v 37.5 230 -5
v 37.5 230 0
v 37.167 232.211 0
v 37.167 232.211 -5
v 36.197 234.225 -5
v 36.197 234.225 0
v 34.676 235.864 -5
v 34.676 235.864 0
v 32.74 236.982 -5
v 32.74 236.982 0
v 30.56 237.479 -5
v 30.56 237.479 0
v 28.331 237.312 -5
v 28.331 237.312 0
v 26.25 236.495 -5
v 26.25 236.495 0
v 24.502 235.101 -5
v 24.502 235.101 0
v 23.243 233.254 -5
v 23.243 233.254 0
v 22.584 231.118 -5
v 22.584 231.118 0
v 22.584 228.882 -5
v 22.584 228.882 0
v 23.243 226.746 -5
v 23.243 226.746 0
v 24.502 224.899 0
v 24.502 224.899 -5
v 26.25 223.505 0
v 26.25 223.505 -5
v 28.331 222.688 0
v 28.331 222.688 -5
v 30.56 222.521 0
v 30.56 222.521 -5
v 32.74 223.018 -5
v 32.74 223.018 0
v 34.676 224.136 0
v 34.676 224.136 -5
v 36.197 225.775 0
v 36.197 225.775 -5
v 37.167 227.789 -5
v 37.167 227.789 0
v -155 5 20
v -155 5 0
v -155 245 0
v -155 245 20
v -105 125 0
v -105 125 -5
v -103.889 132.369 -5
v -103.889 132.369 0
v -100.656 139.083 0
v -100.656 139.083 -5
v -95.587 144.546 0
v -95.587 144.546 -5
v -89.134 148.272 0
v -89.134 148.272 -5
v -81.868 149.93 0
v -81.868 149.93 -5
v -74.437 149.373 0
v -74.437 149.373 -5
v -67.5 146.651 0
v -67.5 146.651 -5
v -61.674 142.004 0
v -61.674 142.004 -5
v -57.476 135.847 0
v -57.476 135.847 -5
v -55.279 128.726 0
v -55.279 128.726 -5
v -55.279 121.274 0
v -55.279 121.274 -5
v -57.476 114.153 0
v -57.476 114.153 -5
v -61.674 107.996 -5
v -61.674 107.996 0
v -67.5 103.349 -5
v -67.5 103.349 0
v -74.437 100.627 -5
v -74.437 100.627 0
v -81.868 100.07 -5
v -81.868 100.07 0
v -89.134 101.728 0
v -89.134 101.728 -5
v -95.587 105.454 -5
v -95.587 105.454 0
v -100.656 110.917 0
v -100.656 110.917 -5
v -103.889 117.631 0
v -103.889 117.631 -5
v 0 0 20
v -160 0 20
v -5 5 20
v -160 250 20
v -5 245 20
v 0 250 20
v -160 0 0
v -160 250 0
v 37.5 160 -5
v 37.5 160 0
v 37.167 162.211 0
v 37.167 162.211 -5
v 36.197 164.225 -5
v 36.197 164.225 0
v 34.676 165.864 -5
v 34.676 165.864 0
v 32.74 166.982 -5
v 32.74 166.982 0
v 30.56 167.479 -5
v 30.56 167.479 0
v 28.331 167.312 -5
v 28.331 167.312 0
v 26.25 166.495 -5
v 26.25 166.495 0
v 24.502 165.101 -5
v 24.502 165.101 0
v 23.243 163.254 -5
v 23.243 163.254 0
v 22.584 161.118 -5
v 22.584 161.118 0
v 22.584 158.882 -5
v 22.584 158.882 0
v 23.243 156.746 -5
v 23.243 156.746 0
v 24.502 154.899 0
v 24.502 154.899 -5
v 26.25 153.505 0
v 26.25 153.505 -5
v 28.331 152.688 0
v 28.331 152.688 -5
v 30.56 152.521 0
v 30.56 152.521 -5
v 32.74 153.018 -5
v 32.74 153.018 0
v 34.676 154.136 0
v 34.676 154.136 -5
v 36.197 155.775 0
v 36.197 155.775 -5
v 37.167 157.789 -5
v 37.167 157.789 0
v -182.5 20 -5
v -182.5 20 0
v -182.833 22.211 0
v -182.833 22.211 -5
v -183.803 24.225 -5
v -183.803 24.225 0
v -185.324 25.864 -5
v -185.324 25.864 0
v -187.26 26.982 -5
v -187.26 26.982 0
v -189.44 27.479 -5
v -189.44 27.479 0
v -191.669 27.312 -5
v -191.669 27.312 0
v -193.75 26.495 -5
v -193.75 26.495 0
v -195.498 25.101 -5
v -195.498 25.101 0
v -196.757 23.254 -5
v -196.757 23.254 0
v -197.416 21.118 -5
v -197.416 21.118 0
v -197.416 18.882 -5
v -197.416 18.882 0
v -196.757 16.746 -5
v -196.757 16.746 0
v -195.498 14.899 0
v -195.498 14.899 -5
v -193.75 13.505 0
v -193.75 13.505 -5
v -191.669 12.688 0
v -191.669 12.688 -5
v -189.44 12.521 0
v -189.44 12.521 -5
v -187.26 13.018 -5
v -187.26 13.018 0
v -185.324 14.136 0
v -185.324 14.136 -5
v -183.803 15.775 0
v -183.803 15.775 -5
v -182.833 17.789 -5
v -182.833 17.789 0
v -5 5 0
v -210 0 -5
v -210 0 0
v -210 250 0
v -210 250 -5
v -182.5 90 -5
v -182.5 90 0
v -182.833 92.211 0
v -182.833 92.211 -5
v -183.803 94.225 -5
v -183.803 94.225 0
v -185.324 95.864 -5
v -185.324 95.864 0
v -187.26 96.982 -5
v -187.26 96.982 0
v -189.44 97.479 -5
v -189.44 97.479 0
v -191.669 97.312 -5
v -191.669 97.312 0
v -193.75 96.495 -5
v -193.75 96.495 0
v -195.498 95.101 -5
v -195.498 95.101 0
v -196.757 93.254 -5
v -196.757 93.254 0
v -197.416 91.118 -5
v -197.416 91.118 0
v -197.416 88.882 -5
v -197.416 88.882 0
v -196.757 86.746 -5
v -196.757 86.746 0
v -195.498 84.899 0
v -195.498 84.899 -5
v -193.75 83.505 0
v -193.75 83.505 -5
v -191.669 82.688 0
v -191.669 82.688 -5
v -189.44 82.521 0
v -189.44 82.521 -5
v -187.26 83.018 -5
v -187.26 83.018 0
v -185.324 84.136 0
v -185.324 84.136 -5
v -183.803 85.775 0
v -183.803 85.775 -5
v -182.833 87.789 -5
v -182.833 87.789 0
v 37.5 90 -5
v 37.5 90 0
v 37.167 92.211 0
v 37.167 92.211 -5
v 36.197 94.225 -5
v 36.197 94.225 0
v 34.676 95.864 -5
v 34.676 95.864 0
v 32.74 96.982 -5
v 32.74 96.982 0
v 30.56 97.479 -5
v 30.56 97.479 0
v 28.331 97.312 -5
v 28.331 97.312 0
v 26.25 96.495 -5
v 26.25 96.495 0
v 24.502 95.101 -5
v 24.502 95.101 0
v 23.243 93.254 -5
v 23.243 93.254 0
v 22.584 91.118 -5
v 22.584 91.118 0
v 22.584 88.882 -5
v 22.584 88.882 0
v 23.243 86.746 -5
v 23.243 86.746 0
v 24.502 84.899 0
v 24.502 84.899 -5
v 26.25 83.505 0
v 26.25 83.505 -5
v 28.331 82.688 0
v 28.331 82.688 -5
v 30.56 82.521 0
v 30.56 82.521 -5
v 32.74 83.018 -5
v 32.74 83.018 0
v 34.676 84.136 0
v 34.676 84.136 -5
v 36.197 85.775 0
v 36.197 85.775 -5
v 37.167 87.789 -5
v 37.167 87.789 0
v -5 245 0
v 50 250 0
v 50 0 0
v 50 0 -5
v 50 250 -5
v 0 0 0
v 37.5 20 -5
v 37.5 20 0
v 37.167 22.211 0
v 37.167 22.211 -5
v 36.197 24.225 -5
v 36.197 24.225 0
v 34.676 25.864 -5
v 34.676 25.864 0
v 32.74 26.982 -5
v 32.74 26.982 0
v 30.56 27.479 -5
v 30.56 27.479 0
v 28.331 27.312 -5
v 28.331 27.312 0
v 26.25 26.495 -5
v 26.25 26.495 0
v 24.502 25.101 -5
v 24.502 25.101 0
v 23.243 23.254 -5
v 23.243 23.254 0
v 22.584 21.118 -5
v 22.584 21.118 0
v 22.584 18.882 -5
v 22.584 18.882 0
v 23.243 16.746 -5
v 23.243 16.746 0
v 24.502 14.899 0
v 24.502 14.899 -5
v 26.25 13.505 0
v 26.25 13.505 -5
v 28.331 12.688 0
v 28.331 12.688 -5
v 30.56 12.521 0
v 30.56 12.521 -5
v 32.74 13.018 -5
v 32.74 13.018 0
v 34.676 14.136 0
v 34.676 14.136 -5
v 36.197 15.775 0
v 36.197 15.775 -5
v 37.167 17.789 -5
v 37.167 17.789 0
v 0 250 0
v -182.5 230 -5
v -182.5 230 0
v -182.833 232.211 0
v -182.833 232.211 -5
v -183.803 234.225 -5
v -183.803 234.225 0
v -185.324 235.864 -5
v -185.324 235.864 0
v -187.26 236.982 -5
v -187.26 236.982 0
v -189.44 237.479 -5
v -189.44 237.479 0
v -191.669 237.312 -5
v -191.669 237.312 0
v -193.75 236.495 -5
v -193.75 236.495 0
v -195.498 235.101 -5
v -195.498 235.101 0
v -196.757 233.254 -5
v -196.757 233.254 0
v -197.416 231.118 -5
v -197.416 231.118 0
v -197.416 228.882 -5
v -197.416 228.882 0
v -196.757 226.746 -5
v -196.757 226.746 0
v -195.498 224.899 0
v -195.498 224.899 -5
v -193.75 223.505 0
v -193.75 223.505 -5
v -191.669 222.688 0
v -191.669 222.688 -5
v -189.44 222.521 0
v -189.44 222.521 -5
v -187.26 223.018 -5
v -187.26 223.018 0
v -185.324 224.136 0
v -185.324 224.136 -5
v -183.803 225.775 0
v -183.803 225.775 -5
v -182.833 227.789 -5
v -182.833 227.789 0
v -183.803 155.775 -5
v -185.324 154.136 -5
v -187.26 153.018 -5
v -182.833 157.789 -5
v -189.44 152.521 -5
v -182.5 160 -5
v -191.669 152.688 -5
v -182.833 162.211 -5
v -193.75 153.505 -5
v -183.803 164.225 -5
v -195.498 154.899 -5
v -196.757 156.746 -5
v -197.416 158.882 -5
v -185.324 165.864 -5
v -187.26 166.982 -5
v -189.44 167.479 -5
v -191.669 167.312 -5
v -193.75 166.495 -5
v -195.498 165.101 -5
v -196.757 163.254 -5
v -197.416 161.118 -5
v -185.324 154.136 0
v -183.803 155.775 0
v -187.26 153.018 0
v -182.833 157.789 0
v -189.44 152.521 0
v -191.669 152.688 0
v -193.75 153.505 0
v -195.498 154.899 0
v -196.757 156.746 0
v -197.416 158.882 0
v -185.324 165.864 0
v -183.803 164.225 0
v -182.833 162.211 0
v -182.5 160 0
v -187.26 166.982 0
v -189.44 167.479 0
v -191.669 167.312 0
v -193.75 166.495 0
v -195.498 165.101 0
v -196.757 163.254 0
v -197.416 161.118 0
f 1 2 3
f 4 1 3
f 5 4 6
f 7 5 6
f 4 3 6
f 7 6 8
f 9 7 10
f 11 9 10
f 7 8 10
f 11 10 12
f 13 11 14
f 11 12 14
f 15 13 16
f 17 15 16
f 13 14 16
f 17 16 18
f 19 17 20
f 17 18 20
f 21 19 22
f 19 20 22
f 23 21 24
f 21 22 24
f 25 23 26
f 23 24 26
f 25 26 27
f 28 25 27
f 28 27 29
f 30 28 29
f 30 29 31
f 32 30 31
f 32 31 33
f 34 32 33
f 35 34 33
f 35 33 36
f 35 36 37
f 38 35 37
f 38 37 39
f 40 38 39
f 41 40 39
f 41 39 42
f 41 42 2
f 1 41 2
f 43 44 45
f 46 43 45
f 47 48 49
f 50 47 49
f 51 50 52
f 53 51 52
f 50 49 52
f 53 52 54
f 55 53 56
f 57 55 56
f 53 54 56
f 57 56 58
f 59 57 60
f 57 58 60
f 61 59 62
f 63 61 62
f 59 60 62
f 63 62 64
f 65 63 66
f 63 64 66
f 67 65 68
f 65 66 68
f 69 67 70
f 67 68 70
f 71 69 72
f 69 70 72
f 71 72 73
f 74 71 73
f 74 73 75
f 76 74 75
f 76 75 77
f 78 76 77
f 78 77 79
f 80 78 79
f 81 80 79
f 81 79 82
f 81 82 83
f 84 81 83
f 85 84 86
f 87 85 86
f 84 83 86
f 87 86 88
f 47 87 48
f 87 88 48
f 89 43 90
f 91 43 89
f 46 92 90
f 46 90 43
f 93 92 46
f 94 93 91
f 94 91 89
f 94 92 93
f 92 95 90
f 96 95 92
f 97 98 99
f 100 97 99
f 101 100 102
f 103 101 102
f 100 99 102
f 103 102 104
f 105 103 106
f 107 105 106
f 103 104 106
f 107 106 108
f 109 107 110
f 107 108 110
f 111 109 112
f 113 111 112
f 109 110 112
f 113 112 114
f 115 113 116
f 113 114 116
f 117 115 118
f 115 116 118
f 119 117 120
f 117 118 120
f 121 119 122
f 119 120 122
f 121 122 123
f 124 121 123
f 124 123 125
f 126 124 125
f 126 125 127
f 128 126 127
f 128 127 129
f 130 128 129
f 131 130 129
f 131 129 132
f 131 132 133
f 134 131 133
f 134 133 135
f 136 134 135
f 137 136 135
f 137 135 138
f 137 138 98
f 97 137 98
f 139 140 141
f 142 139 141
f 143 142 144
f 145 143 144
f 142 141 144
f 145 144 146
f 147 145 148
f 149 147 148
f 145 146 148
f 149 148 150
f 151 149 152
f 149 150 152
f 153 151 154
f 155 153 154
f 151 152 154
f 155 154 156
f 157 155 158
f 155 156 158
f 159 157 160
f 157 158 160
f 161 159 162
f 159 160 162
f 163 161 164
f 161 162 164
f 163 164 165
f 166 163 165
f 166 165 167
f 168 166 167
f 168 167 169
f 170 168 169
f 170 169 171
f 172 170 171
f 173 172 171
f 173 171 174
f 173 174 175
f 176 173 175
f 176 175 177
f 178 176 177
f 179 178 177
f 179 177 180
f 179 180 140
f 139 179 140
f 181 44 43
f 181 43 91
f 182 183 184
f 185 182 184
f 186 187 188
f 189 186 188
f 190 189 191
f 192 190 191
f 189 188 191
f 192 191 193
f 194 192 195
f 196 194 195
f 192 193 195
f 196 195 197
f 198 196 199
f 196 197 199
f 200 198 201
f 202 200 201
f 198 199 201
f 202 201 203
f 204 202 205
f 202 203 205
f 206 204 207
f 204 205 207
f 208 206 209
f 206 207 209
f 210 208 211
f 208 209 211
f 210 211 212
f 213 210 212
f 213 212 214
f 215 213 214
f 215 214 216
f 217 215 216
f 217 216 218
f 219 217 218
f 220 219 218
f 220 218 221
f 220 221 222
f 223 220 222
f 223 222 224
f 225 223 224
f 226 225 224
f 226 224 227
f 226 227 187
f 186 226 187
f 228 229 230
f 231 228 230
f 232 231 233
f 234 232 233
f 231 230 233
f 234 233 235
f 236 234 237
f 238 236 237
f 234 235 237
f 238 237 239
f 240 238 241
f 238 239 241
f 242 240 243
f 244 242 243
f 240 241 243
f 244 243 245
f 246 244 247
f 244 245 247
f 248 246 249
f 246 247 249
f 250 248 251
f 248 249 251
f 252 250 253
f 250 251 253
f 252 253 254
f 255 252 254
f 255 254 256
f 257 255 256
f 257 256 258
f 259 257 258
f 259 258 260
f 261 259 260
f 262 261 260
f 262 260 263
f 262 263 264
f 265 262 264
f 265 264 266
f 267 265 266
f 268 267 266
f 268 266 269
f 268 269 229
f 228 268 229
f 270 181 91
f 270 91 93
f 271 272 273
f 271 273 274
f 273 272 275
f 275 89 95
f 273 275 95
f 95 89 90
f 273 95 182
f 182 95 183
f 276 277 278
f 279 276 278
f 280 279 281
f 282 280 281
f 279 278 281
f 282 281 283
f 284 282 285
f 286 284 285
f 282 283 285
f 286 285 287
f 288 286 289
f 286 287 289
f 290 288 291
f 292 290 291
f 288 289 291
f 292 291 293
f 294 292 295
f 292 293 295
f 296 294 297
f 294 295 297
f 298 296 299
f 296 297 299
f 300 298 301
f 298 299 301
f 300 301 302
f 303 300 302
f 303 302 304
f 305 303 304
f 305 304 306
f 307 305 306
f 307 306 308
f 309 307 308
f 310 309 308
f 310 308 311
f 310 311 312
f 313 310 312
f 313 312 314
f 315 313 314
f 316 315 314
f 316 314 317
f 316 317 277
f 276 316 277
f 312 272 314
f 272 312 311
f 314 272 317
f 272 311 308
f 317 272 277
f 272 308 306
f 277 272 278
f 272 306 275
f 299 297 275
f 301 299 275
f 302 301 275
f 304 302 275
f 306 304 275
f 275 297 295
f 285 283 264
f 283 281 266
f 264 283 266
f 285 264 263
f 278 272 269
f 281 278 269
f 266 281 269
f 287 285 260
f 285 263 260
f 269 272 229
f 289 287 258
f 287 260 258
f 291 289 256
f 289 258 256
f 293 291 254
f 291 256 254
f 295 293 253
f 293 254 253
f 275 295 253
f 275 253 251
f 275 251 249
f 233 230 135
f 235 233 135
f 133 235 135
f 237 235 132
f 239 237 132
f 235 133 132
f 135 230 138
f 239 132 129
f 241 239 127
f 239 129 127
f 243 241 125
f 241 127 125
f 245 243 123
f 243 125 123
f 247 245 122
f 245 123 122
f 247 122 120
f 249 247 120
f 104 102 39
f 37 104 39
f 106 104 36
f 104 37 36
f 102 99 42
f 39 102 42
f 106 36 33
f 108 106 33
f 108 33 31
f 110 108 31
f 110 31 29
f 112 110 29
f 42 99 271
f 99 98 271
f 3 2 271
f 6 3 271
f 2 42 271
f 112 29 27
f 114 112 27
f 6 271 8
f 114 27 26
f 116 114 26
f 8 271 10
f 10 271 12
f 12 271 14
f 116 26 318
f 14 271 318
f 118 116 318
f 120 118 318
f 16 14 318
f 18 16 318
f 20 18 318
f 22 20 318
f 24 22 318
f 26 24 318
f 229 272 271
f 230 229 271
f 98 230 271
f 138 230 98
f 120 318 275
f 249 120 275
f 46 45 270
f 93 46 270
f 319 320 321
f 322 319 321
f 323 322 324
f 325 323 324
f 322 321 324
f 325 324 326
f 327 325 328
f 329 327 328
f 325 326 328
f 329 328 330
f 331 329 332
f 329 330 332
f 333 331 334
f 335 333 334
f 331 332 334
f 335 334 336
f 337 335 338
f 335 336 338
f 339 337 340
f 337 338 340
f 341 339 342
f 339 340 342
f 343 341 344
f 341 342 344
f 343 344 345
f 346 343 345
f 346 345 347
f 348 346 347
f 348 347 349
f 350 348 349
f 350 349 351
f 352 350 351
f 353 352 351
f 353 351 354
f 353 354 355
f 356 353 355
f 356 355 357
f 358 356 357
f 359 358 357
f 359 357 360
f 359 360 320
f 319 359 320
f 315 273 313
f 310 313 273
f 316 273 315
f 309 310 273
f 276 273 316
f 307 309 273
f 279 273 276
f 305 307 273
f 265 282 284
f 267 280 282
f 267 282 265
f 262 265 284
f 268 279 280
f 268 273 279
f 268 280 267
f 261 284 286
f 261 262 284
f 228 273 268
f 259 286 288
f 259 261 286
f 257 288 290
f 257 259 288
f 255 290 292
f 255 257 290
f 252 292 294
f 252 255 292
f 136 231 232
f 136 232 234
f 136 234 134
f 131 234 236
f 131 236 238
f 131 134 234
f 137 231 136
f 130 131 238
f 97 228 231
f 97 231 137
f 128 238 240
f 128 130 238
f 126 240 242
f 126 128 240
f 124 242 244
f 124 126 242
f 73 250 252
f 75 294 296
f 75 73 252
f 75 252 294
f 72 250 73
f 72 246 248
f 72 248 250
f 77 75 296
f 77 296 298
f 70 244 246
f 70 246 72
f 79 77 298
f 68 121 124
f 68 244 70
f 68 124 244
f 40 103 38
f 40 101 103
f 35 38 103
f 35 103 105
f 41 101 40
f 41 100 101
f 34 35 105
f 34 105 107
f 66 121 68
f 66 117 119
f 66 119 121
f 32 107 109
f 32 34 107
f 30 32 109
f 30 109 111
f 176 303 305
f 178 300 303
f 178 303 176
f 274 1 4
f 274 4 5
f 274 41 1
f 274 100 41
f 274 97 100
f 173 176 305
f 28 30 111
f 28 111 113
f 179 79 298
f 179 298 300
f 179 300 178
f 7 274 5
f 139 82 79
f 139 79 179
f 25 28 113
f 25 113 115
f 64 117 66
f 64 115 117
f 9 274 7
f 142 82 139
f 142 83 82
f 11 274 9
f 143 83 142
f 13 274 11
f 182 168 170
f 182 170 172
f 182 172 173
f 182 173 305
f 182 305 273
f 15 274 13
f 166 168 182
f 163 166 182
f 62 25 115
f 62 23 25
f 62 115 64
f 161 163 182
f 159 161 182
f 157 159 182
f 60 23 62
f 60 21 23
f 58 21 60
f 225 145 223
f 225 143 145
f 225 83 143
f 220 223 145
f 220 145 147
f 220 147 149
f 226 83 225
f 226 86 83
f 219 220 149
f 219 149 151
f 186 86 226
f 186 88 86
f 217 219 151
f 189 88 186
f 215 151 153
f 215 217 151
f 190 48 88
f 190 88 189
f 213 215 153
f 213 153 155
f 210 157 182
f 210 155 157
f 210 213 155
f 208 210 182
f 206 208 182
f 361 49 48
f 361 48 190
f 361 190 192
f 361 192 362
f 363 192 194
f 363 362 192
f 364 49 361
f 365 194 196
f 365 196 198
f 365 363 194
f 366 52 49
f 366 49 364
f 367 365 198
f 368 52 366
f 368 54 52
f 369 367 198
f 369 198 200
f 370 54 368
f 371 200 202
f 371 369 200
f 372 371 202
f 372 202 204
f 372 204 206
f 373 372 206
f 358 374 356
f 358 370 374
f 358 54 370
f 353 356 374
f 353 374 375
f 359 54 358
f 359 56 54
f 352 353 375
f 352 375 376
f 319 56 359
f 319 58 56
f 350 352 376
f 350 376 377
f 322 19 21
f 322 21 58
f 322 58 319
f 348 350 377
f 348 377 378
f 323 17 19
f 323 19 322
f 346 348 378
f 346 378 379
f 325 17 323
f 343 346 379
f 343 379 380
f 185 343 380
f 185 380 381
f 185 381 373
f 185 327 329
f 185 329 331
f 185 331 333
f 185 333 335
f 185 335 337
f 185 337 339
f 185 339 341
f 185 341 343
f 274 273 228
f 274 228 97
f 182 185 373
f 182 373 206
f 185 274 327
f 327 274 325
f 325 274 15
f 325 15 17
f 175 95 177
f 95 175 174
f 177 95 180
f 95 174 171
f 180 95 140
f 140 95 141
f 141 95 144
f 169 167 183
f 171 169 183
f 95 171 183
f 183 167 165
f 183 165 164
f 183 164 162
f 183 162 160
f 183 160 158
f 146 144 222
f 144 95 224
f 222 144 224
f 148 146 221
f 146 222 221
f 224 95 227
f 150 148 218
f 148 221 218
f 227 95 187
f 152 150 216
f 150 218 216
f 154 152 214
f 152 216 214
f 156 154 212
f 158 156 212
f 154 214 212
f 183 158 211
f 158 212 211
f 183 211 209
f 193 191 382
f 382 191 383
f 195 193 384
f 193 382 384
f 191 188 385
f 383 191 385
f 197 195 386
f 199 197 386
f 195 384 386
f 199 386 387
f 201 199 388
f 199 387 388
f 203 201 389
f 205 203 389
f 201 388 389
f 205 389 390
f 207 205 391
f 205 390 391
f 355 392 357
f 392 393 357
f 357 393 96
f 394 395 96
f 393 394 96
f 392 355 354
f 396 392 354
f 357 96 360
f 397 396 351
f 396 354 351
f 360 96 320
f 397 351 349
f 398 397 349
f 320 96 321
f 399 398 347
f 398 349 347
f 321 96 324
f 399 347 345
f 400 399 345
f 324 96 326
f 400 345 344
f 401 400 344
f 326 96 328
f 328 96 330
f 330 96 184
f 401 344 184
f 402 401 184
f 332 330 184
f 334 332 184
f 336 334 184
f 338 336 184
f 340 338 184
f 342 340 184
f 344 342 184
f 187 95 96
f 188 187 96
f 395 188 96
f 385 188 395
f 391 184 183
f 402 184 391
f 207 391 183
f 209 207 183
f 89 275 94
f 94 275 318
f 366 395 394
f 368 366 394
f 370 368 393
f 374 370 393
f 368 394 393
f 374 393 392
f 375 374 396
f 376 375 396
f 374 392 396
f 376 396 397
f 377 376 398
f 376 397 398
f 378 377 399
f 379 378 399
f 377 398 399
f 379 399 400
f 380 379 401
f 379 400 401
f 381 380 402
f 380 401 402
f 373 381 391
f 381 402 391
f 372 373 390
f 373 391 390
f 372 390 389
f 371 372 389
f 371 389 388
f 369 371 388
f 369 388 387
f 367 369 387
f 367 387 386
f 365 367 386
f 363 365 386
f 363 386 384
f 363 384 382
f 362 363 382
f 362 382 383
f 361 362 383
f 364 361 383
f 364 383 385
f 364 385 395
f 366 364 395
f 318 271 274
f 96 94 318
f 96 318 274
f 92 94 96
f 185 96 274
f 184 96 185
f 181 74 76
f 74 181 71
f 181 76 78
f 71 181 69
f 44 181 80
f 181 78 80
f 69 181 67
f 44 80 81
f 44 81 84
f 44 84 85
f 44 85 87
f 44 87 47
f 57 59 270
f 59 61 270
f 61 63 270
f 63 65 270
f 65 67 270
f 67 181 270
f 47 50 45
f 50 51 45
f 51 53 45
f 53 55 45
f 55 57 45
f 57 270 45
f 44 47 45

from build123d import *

# Parameters (mm, degrees)
ESQUISSE1_W             = 160
ESQUISSE1_H             = 250
ESQUISSE1_W_2           = 150
ESQUISSE1_H_2           = 240
BOSS_EXTRU_1_DEPTH      = 20
ESQUISSE2_W             = 260
ESQUISSE2_H             = 250
BOSS_EXTRU_2_DEPTH      = 5
ESQUISSE3_R             = 25
ENL_V_MAT_EXTRU_1_DEPTH = 5
ESQUISSE4_R             = 7.5
ENL_V_MAT_EXTRU_2_DEPTH = 10


with BuildPart() as part:
    # Esquisse1 → Boss.-Extru.1 (new body)
    with BuildSketch(Plane.XY):
        with Locations((-80, 125)):
            Rectangle(ESQUISSE1_W, ESQUISSE1_H)
        with Locations((-80, 125)):
            Rectangle(ESQUISSE1_W_2, ESQUISSE1_H_2, mode=Mode.SUBTRACT)
    extrude(amount=BOSS_EXTRU_1_DEPTH)

    # Esquisse2 → Boss.-Extru.2 (add)
    with BuildSketch(Plane(origin=(0, 0, 0), x_dir=(-1, 0, 0), z_dir=(0, 0, -1))):
        with Locations((80, 125)):
            Rectangle(ESQUISSE2_W, ESQUISSE2_H)
    extrude(amount=BOSS_EXTRU_2_DEPTH)

    # Esquisse3 → Enlèv. mat.-Extru.1 (cut)
    with BuildSketch(Plane(origin=(0, 0, -5), x_dir=(-1, 0, 0), z_dir=(0, 0, -1))):
        with Locations((80, 125)):
            Circle(ESQUISSE3_R)
    extrude(amount=-ENL_V_MAT_EXTRU_1_DEPTH, mode=Mode.SUBTRACT)

    # Esquisse4 → Enlèv. mat.-Extru.2 (cut)
    with BuildSketch(Plane.XY):
        with Locations((30, 230)):
            Circle(ESQUISSE4_R)
        with Locations((-190, 230)):
            Circle(ESQUISSE4_R)
        with Locations((-190, 160)):
            Circle(ESQUISSE4_R)
        with Locations((30, 160)):
            Circle(ESQUISSE4_R)
        with Locations((-190, 90)):
            Circle(ESQUISSE4_R)
        with Locations((30, 90)):
            Circle(ESQUISSE4_R)
        with Locations((-190, 20)):
            Circle(ESQUISSE4_R)
        with Locations((30, 20)):
            Circle(ESQUISSE4_R)
    extrude(amount=-ENL_V_MAT_EXTRU_2_DEPTH, mode=Mode.SUBTRACT)


solid = part.part
